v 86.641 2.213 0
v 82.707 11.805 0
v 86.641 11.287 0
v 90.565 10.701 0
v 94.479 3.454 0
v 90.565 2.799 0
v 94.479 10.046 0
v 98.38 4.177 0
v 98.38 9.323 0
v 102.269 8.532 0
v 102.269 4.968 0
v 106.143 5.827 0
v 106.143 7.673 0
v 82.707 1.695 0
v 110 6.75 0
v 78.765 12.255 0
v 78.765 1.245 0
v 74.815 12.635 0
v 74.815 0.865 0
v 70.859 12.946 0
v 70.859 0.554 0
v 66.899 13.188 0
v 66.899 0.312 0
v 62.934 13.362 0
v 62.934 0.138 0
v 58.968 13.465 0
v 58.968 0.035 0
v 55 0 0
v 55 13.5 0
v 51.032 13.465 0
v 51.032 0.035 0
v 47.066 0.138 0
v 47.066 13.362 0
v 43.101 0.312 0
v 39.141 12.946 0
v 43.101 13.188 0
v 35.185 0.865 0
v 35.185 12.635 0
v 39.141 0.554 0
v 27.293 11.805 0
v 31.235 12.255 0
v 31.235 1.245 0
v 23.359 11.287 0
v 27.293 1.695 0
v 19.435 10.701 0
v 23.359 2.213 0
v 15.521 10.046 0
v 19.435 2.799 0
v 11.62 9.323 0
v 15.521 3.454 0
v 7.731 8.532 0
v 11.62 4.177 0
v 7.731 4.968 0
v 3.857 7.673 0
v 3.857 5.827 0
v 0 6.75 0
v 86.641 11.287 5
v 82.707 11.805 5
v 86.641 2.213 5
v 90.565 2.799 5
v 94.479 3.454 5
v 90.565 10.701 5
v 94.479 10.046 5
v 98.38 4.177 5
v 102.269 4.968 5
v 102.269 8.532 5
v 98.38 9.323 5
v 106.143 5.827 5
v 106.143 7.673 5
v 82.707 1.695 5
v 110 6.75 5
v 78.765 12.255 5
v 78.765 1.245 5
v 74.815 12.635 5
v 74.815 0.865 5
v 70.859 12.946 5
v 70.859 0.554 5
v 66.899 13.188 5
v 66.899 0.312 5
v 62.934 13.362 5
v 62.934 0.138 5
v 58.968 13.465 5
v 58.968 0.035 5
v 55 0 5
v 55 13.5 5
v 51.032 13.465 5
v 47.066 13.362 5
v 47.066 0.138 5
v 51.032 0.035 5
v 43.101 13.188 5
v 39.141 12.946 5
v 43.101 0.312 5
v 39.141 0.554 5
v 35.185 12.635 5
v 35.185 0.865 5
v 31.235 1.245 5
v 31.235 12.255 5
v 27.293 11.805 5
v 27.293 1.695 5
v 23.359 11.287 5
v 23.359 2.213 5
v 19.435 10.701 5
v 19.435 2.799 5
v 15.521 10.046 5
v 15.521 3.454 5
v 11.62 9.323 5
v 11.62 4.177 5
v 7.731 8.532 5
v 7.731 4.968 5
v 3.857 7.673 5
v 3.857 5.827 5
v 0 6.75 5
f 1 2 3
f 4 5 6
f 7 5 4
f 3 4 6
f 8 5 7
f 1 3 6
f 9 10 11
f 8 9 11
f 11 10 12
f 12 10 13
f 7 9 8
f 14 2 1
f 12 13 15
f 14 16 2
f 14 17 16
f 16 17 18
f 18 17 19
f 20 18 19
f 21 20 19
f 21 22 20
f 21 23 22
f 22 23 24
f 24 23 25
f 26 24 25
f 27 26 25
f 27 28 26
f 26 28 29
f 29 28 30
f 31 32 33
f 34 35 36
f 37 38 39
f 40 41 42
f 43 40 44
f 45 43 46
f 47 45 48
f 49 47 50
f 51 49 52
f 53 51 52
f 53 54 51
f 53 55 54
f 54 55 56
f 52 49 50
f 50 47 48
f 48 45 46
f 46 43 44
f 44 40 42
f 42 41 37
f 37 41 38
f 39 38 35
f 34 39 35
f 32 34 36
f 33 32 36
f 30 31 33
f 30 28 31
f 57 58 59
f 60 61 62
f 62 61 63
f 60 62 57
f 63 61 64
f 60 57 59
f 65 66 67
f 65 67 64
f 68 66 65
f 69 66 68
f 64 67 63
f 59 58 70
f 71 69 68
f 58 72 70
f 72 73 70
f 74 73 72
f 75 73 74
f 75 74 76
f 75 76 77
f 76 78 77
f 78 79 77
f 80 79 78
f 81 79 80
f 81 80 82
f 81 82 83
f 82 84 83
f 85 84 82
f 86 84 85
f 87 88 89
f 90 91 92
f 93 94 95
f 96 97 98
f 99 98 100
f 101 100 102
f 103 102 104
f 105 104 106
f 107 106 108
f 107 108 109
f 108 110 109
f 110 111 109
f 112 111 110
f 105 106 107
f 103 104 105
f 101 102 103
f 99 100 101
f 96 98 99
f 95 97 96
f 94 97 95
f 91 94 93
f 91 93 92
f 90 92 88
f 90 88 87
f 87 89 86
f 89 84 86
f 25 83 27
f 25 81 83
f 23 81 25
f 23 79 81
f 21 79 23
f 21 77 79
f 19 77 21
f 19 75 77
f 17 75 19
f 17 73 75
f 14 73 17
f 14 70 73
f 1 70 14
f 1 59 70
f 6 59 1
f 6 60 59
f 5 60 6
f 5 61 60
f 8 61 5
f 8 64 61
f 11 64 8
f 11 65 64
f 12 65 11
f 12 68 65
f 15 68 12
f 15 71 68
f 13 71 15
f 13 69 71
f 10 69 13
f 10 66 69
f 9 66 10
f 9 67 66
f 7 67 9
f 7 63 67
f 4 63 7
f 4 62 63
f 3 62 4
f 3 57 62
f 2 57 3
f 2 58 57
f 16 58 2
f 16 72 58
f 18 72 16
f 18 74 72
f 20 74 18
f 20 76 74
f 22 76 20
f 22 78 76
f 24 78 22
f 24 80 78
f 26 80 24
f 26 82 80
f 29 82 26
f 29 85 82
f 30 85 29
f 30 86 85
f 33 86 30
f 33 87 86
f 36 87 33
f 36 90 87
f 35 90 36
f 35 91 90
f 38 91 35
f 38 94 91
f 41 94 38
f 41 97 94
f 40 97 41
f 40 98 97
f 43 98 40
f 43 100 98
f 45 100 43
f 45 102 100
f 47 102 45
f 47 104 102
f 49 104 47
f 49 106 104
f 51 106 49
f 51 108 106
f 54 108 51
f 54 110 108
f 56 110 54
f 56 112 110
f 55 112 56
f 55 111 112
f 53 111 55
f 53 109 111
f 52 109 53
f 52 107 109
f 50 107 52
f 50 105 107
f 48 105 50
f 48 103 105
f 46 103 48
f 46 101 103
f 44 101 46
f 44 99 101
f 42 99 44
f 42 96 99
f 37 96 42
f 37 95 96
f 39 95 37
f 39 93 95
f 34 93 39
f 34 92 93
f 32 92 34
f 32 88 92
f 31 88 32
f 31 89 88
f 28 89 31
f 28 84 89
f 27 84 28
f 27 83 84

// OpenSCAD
$fn = 32;

// ----------------------------------------------------------------------
// Arc profile plate: lens, 56 points
// ----------------------------------------------------------------------

// --- parameters (mm) ---
lens_chord = 110;         // chord length of the lens, X
arc_r = 227.35;           // radius of both arcs
arc_angle = 28;           // angle of each arc, degrees
sagitta = 6.75;           // bulge of each arc (half the lens height)
arc_step = 1;             // sampling step of the arcs, degrees
plate_t = 5;              // plate thickness, Z

bbox_y = 2 * sagitta;  // full lens height

profile = [[110, 6.75], [106.143, 7.673], [102.269, 8.532], [98.38, 9.323], [94.479, 10.046], [90.565, 10.701], [86.641, 11.287], [82.707, 11.805], [78.765, 12.255], [74.815, 12.635], [70.859, 12.946], [66.899, 13.188], [62.934, 13.362], [58.968, 13.465], [55, 13.5], [51.032, 13.465], [47.066, 13.362], [43.101, 13.188], [39.141, 12.946], [35.185, 12.635], [31.235, 12.255], [27.293, 11.805], [23.359, 11.287], [19.435, 10.701], [15.521, 10.046], [11.62, 9.323], [7.731, 8.532], [3.857, 7.673], [0, 6.75], [3.857, 5.827], [7.731, 4.968], [11.62, 4.177], [15.521, 3.454], [19.435, 2.799], [23.359, 2.213], [27.293, 1.695], [31.235, 1.245], [35.185, 0.865], [39.141, 0.554], [43.101, 0.312], [47.066, 0.138], [51.032, 0.035], [55, 0], [58.968, 0.035], [62.934, 0.138], [66.899, 0.312], [70.859, 0.554], [74.815, 0.865], [78.765, 1.245], [82.707, 1.695], [86.641, 2.213], [90.565, 2.799], [94.479, 3.454], [98.38, 4.177], [102.269, 4.968], [106.143, 5.827]];  // primary outline, 56 points, counter clockwise

// --- the one profile operation ---
linear_extrude(height = plate_t) polygon(points = profile);
